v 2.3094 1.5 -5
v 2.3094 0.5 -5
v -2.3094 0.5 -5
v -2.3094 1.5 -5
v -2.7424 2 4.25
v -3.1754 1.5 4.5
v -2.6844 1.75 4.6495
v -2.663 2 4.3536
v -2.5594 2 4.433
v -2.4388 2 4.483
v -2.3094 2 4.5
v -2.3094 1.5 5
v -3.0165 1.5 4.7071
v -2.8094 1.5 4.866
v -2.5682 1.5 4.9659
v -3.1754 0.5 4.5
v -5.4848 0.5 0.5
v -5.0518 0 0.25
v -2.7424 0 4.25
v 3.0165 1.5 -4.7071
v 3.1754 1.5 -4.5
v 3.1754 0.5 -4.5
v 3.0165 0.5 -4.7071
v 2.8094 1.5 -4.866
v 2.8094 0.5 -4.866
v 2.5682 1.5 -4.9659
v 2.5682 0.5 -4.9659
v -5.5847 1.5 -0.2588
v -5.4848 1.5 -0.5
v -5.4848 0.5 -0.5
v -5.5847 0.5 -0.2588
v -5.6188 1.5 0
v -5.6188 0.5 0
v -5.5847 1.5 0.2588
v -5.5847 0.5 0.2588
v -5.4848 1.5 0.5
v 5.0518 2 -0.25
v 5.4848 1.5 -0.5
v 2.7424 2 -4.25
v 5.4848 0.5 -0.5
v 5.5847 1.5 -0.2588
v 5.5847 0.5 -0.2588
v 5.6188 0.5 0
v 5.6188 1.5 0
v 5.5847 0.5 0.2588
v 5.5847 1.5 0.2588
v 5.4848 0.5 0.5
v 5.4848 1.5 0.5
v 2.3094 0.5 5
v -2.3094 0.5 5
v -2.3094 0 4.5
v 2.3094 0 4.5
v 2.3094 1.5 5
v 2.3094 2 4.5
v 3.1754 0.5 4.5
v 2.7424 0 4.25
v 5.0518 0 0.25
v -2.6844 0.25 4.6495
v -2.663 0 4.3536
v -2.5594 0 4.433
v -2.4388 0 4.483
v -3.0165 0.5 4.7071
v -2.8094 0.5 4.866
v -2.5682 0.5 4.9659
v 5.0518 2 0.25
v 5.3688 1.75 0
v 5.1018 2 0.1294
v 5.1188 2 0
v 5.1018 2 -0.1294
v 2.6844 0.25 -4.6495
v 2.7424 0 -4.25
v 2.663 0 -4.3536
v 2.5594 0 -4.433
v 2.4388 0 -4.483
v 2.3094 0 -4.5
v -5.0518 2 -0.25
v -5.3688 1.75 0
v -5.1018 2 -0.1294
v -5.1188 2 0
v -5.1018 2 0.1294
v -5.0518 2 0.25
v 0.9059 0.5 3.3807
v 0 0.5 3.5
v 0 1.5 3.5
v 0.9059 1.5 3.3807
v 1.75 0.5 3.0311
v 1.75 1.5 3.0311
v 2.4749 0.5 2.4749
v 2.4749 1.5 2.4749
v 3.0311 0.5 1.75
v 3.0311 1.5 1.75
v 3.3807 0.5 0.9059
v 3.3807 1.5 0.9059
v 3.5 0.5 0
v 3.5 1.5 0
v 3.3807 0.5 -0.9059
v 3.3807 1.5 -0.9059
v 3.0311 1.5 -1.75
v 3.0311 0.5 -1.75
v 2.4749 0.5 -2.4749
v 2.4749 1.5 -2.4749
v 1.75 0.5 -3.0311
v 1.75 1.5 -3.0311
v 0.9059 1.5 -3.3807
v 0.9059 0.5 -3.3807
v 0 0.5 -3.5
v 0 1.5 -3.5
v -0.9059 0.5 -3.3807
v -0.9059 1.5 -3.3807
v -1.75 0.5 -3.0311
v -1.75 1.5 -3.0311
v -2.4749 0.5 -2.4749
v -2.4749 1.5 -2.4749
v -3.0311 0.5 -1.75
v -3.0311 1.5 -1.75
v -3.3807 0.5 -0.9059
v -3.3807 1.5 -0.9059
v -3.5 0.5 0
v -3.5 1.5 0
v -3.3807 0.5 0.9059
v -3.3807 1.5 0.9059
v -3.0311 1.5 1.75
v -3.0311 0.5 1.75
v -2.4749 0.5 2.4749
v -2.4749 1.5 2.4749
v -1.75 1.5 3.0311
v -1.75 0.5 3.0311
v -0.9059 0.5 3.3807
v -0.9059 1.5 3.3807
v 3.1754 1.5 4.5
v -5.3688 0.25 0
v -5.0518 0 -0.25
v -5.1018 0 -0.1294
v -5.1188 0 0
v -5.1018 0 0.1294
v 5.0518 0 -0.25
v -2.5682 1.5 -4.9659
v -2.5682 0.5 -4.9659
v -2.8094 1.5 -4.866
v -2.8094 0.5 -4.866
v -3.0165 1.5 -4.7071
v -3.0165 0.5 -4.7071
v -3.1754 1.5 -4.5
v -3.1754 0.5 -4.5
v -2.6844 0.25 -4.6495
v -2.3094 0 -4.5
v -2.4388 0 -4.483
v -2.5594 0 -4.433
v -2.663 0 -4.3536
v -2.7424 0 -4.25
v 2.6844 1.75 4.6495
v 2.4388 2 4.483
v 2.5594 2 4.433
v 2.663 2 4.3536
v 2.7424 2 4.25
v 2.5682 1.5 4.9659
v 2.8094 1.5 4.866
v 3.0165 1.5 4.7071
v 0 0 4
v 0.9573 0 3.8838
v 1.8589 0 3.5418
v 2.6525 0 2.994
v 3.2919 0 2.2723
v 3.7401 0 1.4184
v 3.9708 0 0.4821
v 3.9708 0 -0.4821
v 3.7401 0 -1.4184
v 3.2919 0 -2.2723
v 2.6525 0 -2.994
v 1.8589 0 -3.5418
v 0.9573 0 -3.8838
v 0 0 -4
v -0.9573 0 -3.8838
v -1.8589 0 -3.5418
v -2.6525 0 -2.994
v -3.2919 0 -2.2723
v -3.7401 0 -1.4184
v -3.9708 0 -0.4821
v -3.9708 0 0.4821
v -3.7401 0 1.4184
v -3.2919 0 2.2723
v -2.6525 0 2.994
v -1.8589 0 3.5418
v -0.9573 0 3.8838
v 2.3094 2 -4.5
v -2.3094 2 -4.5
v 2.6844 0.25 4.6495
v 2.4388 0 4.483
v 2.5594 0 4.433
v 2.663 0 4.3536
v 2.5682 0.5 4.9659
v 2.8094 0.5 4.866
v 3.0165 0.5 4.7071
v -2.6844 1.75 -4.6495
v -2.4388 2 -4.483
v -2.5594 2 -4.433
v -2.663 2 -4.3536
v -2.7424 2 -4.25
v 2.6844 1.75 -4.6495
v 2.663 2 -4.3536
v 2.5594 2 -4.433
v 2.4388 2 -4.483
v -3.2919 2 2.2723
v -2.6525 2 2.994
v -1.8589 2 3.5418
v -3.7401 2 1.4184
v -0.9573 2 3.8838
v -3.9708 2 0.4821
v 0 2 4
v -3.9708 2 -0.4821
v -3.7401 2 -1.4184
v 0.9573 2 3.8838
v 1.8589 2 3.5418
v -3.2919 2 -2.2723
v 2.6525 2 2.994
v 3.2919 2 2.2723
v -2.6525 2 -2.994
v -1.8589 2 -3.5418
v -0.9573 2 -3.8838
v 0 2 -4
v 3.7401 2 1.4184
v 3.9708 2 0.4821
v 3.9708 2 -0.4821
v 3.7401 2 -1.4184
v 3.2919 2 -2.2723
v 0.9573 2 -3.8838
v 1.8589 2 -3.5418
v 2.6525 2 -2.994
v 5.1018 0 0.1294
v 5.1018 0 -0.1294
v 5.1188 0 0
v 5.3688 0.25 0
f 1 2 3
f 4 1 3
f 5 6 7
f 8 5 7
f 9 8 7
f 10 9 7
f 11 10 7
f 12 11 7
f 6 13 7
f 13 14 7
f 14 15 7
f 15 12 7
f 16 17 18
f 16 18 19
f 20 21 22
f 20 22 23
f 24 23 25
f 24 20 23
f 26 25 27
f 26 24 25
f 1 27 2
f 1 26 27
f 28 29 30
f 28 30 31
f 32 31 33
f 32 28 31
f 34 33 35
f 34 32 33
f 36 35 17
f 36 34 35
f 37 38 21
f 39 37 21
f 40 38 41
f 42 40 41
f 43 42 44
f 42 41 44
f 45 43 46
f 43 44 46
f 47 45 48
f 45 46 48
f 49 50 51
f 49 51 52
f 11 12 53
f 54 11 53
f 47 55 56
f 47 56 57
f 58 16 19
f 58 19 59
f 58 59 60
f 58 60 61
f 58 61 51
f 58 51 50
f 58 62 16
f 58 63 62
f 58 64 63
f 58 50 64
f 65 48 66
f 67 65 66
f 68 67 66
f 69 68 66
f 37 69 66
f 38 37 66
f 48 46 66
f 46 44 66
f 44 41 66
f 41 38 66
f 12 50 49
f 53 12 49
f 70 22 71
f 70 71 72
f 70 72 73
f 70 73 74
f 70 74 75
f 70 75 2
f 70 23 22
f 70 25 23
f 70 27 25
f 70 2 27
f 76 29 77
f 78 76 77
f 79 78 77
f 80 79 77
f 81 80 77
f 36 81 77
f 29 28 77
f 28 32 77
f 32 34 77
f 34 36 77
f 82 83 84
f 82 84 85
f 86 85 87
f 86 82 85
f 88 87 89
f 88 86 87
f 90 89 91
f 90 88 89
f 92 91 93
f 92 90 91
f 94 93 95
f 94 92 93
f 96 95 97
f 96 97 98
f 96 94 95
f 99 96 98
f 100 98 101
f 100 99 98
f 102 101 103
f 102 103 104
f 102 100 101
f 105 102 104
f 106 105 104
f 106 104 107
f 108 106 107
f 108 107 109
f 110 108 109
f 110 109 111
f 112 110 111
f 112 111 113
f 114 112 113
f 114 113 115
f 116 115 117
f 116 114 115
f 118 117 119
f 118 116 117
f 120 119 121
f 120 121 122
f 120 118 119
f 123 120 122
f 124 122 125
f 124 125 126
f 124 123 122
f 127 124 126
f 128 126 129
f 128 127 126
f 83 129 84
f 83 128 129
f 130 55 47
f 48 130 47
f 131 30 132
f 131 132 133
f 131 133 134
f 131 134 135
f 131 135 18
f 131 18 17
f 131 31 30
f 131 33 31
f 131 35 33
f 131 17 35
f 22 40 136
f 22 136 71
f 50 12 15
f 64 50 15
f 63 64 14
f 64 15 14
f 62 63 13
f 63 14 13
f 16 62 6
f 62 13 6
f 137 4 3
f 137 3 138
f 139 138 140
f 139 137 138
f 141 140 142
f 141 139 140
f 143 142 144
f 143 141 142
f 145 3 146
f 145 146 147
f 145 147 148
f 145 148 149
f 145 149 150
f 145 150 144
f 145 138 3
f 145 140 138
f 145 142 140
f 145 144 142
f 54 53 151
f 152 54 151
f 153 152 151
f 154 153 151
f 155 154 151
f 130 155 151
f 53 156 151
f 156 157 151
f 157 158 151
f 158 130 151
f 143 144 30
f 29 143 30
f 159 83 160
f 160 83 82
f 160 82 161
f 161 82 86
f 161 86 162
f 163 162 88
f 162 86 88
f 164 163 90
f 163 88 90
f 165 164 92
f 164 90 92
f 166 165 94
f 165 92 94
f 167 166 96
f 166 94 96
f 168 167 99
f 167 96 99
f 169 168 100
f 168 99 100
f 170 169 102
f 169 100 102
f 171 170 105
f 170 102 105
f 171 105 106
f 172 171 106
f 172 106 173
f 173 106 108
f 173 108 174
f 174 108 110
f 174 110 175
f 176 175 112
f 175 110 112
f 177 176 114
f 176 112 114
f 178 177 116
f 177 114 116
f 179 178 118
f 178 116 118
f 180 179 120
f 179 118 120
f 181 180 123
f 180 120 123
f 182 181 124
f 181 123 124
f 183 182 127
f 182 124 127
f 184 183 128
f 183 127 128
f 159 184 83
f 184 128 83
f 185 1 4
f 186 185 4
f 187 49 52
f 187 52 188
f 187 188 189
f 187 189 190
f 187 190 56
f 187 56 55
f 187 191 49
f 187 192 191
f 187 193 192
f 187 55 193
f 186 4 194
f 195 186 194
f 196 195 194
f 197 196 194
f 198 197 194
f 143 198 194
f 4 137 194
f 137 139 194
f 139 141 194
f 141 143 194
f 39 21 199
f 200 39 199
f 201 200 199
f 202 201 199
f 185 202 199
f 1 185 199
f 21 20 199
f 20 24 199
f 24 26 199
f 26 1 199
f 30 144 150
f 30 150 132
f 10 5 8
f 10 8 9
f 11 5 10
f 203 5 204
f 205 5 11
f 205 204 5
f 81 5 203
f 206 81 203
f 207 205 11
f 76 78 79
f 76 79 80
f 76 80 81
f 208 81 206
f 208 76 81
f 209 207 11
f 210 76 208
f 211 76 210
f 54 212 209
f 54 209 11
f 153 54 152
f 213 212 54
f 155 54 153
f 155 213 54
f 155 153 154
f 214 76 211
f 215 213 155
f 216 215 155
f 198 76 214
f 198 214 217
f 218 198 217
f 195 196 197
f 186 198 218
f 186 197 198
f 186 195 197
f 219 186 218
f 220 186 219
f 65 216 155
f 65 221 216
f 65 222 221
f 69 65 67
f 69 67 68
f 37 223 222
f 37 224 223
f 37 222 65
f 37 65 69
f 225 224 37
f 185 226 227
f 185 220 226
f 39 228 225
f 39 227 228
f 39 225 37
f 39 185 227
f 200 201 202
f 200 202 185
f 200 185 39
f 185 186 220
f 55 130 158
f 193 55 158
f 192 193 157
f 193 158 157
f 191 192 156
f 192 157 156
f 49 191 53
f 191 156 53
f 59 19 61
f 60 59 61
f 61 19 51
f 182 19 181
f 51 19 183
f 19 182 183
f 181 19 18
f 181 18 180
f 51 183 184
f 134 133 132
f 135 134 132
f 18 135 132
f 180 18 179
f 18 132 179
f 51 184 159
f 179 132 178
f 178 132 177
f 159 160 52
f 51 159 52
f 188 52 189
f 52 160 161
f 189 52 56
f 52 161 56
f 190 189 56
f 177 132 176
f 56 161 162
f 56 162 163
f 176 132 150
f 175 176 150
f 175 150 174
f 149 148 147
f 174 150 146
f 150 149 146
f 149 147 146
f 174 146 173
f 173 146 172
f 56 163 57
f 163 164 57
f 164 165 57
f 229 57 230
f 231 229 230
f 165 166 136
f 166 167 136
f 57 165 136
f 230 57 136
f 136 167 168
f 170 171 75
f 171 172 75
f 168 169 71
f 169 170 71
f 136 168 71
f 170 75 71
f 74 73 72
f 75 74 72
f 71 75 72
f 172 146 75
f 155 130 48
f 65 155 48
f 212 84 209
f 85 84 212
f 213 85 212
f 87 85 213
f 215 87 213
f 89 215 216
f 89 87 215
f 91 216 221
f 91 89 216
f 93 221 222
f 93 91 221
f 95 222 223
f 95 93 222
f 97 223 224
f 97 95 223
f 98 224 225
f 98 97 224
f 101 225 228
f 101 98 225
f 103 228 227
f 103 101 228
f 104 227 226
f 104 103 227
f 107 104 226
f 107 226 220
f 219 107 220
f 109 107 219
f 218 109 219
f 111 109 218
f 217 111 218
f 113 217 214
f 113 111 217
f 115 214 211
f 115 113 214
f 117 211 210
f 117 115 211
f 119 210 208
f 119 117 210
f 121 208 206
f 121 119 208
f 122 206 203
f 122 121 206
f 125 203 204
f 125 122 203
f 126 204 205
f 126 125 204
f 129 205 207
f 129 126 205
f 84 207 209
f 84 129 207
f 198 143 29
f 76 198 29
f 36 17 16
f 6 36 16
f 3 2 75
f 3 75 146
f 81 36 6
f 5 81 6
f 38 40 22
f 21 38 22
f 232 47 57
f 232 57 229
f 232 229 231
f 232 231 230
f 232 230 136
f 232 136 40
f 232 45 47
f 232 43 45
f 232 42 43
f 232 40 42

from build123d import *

# Parameters (mm, degrees)
SKETCH_1_R      = 3.5
EXTRUDE_1_DEPTH = 2
FILLET_1_R      = 1
CHAMFER_1_SIZE  = 0.5


with BuildPart() as part:
    # 草图1 → 凸台-拉伸1 (new body)
    with BuildSketch(Plane(origin=(0, 0, 0), x_dir=(1, 0, 0), z_dir=(0, 1, 0))):
        Polygon((5.773502692, 0), (2.886751346, 5), (-2.886751346, 5), (-5.773502692, 0), (-2.886751346, -5), (2.886751346, -5), align=None)
        with Locations(Location((0, 0, 0), (0, 0, 270))):
            Circle(SKETCH_1_R, mode=Mode.SUBTRACT)
    extrude(amount=EXTRUDE_1_DEPTH)

    # 圆角1
    fillet_1_edges = [part.edges().sort_by_distance(p)[0] for p in [
        (2.886751346, 1, 5),
        (-2.886751346, 1, 5),
        (-5.773502692, 1, 0),
        (-2.886751346, 1, -5),
        (2.886751346, 1, -5),
        (5.773502692, 1, 0),
    ]]
    fillet(fillet_1_edges, radius=FILLET_1_R)

    # 倒角1
    chamfer_1_edges = [part.edges().sort_by_distance(p)[0] for p in [
        (0, 0, -3.5),
        (0, 2, -3.5),
        (-4.330127019, 0, 2.5),
        (-4.330127019, 2, 2.5),
        (4.330127019, 0, 2.5),
        (0, 0, 5),
        (-4.330127019, 0, -2.5),
        (0, 0, -5),
        (4.330127019, 0, -2.5),
        (-2.809401077, 0, 4.866025404),
        (2.809401077, 0, 4.866025404),
        (5.618802154, 0, 0),
        (2.809401077, 0, -4.866025404),
        (-2.809401077, 0, -4.866025404),
        (-5.618802154, 0, 0),
        (-4.330127019, 2, -2.5),
        (4.330127019, 2, 2.5),
        (4.330127019, 2, -2.5),
        (0, 2, -5),
        (0, 2, 5),
        (-2.809401077, 2, 4.866025404),
        (2.809401077, 2, 4.866025404),
        (5.618802154, 2, 0),
        (2.809401077, 2, -4.866025404),
        (-2.809401077, 2, -4.866025404),
        (-5.618802154, 2, 0),
    ]]
    chamfer(chamfer_1_edges, length=CHAMFER_1_SIZE)


solid = part.part
